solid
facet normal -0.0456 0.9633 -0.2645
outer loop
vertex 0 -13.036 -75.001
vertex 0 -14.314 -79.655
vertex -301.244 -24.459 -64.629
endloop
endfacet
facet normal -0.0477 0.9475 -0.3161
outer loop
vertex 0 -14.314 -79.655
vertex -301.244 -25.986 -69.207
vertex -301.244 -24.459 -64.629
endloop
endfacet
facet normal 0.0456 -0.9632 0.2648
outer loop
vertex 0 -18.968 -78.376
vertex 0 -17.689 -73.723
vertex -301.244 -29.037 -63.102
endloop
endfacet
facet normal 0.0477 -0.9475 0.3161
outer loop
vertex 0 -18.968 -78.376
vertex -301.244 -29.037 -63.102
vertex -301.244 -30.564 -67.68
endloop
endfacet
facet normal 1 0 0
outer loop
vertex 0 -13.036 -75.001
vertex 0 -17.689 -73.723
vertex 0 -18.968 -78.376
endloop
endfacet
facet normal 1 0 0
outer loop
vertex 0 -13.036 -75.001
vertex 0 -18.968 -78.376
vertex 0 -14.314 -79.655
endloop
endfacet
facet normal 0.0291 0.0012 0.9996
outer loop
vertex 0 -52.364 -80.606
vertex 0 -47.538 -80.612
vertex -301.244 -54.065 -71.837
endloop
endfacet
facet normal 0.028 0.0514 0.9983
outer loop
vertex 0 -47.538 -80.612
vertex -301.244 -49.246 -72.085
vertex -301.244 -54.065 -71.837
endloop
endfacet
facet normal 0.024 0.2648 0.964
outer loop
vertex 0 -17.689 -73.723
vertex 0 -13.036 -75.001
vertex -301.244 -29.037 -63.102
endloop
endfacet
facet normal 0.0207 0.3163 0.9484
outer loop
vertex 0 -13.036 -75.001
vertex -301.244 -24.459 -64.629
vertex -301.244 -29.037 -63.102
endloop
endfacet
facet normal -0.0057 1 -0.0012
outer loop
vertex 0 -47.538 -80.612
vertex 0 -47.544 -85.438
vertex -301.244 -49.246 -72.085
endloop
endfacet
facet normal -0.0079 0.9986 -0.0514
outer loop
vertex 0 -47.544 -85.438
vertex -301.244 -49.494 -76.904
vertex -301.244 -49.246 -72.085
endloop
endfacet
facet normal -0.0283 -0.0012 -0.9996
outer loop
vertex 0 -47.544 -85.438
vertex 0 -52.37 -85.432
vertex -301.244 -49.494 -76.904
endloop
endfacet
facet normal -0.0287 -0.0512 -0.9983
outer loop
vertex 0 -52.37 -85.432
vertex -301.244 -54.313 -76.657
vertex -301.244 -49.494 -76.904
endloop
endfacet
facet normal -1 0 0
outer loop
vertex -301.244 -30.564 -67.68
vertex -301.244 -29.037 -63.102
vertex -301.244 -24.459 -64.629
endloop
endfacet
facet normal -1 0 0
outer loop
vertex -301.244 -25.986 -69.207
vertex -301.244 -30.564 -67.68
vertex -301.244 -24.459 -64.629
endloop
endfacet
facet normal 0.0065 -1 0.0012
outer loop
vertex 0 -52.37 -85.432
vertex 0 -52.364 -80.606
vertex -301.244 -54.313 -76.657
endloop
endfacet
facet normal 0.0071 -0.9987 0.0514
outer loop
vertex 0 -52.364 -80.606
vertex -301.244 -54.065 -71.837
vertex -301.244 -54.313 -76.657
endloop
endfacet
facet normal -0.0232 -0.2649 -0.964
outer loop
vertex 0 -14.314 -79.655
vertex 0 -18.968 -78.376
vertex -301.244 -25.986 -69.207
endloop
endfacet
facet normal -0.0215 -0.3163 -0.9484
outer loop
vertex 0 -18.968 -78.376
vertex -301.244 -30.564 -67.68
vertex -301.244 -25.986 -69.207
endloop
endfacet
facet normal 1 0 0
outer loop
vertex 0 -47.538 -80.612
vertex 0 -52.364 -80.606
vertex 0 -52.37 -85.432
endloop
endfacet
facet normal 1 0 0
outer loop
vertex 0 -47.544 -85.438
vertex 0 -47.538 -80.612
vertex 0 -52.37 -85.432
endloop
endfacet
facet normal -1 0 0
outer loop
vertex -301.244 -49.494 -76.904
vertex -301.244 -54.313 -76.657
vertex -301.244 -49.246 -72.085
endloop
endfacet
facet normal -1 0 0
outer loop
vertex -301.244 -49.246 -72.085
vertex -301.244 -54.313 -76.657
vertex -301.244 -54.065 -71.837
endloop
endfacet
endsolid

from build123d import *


with BuildPart() as part:
    # Sketch1_3 → Loft2 section 0
    with BuildSketch(Plane(origin=(0, 0, 0), x_dir=(0, 0, -1), z_dir=(1, 0, 0))):
        Polygon((73.722592843, -17.689285792), (78.376128634, -18.967910303), (79.654753145, -14.314374511), (75.001217353, -13.035750001), align=None)
    # Sketch2_3 → Loft2 section 1
    with BuildSketch(Plane(origin=(-301.244, 0, 0), x_dir=(0, 0, -1), z_dir=(1, 0, 0))):
        Polygon((67.679850957, -30.564309841), (63.101919005, -29.03695427), (64.629274577, -24.459022317), (69.207206529, -25.986377889), align=None)
    loft()


with BuildPart() as body_2:
    # Sketch1_6 → Loft5 section 0
    with BuildSketch(Plane(origin=(0, 0, 0), x_dir=(0, 0, -1), z_dir=(1, 0, 0))):
        Polygon((80.606015408, -52.363936617), (85.432011787, -52.369848162), (85.437923333, -47.543851783), (80.611926953, -47.537940238), align=None)
    # Sketch2_8 → Loft5 section 1
    with BuildSketch(Plane(origin=(-301.244, 0, 0), x_dir=(0, 0, -1), z_dir=(1, 0, 0))):
        Polygon((76.656597753, -54.31319682), (71.836959606, -54.065478974), (72.084677452, -49.245840827), (76.904315599, -49.493558673), align=None)
    loft()


solid = Compound([part.part, body_2.part])
